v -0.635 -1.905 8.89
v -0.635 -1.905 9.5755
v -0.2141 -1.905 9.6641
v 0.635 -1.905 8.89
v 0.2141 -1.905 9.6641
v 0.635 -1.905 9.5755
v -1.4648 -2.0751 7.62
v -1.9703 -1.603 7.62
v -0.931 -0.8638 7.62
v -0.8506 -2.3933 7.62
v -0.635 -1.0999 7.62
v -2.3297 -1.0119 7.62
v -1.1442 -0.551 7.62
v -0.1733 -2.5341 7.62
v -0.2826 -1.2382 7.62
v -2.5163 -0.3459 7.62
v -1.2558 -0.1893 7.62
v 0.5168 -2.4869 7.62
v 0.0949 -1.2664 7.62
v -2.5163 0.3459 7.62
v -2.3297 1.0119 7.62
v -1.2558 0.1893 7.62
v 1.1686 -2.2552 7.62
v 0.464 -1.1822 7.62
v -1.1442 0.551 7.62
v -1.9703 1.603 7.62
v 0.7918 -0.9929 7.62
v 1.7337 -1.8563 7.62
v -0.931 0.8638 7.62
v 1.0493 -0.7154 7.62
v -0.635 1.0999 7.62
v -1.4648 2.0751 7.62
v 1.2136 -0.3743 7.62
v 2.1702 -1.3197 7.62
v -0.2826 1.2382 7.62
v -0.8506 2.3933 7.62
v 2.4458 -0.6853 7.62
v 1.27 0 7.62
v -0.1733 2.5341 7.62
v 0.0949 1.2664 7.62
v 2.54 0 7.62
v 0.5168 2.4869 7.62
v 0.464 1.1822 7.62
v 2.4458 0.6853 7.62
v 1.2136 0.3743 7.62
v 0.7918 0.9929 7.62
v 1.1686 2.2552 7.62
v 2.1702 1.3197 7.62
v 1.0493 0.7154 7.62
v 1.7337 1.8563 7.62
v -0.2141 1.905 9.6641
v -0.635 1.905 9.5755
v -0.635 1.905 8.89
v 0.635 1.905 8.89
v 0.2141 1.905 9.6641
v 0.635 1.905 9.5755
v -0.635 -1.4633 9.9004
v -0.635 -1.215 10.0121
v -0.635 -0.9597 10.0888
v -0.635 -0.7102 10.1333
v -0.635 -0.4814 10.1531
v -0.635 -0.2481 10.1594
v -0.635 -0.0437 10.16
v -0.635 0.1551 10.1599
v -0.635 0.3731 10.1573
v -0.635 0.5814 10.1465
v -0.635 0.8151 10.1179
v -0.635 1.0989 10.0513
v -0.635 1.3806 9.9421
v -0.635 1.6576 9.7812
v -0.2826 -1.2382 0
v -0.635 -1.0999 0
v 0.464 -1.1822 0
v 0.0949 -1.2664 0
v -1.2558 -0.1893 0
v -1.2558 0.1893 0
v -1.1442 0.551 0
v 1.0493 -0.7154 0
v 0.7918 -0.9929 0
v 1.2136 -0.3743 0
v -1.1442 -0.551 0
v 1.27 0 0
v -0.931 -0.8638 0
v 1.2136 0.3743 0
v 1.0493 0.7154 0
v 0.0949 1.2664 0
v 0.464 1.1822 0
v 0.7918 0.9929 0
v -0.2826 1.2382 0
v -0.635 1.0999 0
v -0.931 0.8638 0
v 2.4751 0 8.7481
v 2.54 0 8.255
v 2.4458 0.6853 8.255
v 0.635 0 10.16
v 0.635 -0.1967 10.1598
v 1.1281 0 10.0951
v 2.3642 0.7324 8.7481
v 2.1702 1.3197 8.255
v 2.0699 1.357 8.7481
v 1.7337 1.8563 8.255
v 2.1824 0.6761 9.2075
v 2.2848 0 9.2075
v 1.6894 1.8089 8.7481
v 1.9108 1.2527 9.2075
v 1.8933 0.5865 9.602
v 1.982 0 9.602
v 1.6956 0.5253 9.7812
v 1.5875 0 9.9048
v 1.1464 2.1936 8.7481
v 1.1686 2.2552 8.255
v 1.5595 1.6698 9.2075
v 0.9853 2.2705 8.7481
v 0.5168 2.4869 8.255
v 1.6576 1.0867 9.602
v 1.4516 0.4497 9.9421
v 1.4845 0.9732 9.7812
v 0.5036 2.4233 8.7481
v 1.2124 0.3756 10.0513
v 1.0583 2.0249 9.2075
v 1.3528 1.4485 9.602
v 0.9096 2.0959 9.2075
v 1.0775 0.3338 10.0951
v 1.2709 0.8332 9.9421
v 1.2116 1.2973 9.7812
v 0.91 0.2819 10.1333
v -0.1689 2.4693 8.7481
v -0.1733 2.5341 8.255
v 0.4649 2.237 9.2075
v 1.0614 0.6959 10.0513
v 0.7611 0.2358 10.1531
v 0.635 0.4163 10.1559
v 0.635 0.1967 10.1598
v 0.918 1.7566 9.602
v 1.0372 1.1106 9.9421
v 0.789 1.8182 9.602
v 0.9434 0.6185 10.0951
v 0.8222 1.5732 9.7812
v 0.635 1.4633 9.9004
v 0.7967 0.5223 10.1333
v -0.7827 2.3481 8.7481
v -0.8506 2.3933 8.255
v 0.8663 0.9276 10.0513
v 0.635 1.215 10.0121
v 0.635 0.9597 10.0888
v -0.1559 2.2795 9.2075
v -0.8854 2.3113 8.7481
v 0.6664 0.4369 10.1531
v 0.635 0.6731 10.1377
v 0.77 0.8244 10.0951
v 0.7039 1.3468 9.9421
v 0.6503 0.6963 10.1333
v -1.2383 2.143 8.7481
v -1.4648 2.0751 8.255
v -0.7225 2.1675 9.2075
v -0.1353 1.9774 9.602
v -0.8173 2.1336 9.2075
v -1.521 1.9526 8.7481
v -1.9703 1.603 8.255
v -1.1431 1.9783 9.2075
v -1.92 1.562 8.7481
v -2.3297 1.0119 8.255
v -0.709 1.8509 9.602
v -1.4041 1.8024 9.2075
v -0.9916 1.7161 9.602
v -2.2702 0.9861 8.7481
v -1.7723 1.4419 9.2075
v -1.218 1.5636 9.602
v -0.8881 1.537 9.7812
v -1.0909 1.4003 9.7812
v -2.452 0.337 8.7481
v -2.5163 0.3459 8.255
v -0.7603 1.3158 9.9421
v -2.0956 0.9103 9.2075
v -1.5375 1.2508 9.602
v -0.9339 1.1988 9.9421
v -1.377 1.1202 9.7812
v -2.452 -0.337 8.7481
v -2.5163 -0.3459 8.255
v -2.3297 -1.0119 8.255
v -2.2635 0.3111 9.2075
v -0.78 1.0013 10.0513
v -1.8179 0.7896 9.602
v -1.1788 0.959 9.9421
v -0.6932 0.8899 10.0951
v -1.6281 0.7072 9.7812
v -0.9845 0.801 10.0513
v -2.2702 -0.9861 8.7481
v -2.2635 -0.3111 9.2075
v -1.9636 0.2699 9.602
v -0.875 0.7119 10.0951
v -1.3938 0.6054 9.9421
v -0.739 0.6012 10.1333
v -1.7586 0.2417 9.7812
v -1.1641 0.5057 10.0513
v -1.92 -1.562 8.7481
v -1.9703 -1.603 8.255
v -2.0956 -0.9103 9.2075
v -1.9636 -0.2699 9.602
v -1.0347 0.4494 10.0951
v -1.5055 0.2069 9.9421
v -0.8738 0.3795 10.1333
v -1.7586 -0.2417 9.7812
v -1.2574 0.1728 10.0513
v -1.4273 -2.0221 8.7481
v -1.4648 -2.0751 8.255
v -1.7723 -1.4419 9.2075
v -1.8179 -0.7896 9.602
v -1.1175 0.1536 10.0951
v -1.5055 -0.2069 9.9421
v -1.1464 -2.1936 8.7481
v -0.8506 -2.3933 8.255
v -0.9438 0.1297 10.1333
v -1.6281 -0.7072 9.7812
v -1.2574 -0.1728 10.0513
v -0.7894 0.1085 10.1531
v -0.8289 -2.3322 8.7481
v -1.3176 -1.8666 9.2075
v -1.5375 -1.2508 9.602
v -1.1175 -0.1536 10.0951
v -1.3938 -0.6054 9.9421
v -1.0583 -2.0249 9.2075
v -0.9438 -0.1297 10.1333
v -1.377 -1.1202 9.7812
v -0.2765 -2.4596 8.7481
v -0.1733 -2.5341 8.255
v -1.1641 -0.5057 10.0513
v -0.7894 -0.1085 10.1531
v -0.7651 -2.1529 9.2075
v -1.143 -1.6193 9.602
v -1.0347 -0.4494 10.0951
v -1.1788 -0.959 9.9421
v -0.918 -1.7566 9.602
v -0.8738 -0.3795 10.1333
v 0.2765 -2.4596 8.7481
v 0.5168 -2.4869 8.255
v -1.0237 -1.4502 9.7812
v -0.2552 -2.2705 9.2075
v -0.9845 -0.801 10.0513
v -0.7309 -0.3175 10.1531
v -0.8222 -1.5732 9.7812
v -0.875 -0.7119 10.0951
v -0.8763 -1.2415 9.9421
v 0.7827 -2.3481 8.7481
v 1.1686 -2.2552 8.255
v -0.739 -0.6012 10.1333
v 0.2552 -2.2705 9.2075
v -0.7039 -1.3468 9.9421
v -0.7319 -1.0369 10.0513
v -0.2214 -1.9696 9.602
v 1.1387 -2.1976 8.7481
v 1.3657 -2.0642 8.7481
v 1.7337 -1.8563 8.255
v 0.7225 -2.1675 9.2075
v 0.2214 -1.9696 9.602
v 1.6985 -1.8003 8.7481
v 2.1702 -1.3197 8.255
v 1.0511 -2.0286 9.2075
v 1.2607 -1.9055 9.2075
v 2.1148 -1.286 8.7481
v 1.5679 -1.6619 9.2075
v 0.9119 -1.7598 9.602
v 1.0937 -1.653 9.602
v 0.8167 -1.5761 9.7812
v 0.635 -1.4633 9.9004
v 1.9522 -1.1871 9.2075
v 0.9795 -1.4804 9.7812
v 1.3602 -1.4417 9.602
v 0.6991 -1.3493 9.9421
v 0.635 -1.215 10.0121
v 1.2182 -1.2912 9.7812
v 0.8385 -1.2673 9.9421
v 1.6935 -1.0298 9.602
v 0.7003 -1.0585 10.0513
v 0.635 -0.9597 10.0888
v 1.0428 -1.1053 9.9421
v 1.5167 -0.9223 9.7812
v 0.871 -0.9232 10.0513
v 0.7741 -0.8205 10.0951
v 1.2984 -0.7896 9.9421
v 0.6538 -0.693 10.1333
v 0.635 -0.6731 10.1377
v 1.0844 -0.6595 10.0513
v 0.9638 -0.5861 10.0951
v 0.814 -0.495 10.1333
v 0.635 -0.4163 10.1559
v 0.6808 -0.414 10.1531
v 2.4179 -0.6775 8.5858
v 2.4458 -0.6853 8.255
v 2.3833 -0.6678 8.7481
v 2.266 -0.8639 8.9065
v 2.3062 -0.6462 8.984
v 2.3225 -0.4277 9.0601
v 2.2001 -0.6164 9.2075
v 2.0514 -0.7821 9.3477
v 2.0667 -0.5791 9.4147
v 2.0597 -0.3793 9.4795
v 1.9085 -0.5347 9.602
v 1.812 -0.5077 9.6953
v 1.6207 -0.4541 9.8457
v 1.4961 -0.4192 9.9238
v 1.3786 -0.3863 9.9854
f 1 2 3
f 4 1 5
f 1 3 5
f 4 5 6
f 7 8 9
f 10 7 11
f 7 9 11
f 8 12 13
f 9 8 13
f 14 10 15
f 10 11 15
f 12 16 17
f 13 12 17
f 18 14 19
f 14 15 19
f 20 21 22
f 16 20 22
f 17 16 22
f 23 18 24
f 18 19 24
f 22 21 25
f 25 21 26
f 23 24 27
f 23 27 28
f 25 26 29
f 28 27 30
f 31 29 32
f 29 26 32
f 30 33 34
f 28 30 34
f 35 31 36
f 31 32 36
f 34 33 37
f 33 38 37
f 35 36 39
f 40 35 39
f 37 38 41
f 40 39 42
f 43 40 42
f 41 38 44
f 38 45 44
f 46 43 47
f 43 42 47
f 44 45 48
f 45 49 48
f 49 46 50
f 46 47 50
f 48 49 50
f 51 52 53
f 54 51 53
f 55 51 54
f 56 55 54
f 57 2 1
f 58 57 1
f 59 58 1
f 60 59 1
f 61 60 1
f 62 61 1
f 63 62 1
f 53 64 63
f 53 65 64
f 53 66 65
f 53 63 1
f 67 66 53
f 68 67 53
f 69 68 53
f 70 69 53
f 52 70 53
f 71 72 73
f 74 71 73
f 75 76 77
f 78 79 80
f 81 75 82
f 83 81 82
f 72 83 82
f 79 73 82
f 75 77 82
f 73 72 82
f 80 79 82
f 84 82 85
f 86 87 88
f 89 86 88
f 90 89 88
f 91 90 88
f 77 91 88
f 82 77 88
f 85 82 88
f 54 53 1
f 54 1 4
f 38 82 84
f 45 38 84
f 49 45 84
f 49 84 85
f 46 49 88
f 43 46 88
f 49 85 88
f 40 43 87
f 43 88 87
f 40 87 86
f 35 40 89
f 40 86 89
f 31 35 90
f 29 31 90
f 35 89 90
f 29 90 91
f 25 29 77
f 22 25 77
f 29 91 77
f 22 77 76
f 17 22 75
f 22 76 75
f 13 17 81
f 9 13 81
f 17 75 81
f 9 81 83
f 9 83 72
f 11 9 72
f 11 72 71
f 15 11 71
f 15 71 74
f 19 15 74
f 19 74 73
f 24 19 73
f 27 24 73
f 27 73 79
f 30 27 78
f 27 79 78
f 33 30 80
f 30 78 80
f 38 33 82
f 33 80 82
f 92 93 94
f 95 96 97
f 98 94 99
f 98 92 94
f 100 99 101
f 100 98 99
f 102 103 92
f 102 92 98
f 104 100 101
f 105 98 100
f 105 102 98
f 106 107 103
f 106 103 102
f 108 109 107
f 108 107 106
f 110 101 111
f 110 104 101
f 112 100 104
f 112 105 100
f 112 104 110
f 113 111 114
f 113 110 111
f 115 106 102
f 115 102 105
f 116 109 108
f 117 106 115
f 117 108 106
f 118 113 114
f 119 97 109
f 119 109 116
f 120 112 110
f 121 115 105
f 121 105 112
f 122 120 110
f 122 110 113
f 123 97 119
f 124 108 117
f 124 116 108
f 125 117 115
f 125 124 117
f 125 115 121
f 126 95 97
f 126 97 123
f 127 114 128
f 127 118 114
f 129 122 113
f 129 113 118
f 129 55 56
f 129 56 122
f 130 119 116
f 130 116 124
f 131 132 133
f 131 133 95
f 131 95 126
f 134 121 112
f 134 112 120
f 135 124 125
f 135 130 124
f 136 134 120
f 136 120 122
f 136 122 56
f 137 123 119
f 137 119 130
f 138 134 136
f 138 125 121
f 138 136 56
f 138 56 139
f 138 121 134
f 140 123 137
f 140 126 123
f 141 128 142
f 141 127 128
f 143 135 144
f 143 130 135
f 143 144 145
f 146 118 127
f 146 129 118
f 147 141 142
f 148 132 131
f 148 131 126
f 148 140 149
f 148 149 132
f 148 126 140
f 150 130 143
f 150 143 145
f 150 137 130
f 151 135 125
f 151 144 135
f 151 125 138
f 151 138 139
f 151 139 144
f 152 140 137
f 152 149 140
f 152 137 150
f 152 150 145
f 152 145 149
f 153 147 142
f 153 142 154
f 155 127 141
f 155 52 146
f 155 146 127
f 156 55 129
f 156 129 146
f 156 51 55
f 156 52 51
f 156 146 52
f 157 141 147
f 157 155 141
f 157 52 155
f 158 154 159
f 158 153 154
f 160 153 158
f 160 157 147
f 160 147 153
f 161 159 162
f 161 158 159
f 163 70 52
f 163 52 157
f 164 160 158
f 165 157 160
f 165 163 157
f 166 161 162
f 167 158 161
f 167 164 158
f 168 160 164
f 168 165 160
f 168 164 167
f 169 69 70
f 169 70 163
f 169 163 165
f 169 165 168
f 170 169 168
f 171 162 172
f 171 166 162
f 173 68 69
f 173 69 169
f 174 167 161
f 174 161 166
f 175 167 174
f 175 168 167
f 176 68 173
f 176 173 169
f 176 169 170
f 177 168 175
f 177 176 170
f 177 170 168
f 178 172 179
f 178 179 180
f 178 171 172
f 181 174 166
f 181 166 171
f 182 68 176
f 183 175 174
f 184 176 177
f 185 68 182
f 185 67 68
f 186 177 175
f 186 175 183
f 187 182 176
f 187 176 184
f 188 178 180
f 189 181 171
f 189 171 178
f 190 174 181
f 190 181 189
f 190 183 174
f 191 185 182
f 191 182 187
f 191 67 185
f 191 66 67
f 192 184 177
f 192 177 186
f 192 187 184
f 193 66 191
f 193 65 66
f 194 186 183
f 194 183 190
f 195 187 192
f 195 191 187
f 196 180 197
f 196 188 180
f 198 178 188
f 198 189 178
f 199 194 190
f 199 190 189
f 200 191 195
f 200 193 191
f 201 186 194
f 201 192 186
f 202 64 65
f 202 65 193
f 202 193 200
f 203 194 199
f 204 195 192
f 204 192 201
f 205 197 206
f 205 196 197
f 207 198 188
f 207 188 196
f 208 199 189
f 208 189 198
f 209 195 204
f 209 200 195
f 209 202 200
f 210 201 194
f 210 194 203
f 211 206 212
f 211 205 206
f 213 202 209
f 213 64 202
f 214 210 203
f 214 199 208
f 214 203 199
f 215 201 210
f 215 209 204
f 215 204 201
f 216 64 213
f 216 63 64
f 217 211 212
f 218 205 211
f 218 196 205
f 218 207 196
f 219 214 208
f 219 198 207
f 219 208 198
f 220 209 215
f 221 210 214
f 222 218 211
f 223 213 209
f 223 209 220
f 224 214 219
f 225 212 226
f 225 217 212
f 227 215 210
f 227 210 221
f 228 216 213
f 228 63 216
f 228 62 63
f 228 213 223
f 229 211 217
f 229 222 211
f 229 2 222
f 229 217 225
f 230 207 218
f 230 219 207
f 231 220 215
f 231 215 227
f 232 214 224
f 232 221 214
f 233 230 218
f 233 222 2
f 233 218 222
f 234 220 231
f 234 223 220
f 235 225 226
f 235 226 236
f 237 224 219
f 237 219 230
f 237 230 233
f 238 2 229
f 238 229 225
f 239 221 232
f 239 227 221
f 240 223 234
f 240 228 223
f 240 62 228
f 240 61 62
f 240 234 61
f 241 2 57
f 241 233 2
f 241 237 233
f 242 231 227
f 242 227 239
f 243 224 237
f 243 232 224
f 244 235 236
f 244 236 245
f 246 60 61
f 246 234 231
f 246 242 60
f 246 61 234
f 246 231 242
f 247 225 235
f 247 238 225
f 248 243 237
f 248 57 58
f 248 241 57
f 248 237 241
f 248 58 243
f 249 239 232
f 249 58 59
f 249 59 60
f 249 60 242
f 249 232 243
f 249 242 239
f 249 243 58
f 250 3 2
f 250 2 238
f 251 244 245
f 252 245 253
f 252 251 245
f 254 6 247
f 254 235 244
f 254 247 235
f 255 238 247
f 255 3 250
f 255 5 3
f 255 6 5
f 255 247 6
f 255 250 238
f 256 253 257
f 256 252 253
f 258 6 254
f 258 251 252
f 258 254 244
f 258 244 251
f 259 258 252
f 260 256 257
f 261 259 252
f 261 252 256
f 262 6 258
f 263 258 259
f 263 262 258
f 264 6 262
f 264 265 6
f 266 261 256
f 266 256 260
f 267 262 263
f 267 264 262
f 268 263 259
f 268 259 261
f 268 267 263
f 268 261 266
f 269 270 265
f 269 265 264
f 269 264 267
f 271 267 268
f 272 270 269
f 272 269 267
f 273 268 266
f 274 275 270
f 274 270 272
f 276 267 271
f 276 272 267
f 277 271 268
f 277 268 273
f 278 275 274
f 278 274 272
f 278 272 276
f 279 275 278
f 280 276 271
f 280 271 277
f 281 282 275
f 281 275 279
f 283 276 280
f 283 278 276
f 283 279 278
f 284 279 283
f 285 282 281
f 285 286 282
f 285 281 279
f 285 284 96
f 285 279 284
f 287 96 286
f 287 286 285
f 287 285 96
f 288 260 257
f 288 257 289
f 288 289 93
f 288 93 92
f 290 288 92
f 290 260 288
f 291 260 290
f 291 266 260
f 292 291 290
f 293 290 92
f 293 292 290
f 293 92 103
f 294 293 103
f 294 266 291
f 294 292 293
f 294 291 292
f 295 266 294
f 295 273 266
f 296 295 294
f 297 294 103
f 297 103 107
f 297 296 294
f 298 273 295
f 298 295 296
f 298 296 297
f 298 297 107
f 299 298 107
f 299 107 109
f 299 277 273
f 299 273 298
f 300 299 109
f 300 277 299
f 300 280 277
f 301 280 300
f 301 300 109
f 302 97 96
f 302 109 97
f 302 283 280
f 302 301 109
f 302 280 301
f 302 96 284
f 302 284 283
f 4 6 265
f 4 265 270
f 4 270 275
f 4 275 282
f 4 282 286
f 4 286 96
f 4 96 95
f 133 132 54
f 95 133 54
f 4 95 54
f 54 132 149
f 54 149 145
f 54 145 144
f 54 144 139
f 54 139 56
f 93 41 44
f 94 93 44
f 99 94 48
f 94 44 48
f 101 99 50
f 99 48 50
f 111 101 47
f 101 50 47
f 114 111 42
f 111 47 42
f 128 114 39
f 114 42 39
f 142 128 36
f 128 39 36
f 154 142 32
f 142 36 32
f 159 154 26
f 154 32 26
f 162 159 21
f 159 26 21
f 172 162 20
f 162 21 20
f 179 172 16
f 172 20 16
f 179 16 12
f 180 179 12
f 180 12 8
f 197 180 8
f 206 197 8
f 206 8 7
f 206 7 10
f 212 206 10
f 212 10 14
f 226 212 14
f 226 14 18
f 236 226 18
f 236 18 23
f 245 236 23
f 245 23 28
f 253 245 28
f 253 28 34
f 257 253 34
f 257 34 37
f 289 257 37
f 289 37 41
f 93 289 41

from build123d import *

# Parameters (mm, degrees)
F0_R     = 1.27
F1_DEPTH = 7.62
F2_R     = 2.54
F3_DEPTH = 2.54
F4_W     = 1.27
F4_H     = 3.81
F5_DEPTH = 1.27


# Not quite as in the source:
# - a fillet or chamfer that OpenCascade refuses, or shapes differently, is made with other operations: its cross-section is extruded or revolved along the edge and cut away or added


with BuildPart() as f1:
    # F0 (on Top) → F1 (new body)
    with BuildSketch(Plane.XY):
        Circle(F0_R)
    extrude(amount=F1_DEPTH)

    # F2 (on face) → F3 (join)
    with BuildSketch(Plane.XY.offset(7.62)):
        Circle(F2_R)
    extrude(amount=F3_DEPTH)

    # F4 (on face) → F5 (cut)
    with BuildSketch(Plane.XY.offset(10.16)):
        Rectangle(F4_W, F4_H)
    extrude(amount=-F5_DEPTH, mode=Mode.SUBTRACT)

    # F6: fillet of radius 1.905 on 1 edges, made by hand

    # F6_s1 → F6_t2 (revolve, cut)
    with BuildSketch(Plane.XZ):
        with BuildLine():
            ThreePointArc((2.54, 8.255), (1.9820384182, 9.6020384182), (0.635, 10.16))
            Line((0.635, 10.16), (2.54, 10.16))
            Line((2.54, 10.16), (2.54, 8.255))
        make_face()
    revolve(axis=Axis((0, 0, 10.16), (0, 0, 1)), mode=Mode.SUBTRACT)


solid = f1.part
